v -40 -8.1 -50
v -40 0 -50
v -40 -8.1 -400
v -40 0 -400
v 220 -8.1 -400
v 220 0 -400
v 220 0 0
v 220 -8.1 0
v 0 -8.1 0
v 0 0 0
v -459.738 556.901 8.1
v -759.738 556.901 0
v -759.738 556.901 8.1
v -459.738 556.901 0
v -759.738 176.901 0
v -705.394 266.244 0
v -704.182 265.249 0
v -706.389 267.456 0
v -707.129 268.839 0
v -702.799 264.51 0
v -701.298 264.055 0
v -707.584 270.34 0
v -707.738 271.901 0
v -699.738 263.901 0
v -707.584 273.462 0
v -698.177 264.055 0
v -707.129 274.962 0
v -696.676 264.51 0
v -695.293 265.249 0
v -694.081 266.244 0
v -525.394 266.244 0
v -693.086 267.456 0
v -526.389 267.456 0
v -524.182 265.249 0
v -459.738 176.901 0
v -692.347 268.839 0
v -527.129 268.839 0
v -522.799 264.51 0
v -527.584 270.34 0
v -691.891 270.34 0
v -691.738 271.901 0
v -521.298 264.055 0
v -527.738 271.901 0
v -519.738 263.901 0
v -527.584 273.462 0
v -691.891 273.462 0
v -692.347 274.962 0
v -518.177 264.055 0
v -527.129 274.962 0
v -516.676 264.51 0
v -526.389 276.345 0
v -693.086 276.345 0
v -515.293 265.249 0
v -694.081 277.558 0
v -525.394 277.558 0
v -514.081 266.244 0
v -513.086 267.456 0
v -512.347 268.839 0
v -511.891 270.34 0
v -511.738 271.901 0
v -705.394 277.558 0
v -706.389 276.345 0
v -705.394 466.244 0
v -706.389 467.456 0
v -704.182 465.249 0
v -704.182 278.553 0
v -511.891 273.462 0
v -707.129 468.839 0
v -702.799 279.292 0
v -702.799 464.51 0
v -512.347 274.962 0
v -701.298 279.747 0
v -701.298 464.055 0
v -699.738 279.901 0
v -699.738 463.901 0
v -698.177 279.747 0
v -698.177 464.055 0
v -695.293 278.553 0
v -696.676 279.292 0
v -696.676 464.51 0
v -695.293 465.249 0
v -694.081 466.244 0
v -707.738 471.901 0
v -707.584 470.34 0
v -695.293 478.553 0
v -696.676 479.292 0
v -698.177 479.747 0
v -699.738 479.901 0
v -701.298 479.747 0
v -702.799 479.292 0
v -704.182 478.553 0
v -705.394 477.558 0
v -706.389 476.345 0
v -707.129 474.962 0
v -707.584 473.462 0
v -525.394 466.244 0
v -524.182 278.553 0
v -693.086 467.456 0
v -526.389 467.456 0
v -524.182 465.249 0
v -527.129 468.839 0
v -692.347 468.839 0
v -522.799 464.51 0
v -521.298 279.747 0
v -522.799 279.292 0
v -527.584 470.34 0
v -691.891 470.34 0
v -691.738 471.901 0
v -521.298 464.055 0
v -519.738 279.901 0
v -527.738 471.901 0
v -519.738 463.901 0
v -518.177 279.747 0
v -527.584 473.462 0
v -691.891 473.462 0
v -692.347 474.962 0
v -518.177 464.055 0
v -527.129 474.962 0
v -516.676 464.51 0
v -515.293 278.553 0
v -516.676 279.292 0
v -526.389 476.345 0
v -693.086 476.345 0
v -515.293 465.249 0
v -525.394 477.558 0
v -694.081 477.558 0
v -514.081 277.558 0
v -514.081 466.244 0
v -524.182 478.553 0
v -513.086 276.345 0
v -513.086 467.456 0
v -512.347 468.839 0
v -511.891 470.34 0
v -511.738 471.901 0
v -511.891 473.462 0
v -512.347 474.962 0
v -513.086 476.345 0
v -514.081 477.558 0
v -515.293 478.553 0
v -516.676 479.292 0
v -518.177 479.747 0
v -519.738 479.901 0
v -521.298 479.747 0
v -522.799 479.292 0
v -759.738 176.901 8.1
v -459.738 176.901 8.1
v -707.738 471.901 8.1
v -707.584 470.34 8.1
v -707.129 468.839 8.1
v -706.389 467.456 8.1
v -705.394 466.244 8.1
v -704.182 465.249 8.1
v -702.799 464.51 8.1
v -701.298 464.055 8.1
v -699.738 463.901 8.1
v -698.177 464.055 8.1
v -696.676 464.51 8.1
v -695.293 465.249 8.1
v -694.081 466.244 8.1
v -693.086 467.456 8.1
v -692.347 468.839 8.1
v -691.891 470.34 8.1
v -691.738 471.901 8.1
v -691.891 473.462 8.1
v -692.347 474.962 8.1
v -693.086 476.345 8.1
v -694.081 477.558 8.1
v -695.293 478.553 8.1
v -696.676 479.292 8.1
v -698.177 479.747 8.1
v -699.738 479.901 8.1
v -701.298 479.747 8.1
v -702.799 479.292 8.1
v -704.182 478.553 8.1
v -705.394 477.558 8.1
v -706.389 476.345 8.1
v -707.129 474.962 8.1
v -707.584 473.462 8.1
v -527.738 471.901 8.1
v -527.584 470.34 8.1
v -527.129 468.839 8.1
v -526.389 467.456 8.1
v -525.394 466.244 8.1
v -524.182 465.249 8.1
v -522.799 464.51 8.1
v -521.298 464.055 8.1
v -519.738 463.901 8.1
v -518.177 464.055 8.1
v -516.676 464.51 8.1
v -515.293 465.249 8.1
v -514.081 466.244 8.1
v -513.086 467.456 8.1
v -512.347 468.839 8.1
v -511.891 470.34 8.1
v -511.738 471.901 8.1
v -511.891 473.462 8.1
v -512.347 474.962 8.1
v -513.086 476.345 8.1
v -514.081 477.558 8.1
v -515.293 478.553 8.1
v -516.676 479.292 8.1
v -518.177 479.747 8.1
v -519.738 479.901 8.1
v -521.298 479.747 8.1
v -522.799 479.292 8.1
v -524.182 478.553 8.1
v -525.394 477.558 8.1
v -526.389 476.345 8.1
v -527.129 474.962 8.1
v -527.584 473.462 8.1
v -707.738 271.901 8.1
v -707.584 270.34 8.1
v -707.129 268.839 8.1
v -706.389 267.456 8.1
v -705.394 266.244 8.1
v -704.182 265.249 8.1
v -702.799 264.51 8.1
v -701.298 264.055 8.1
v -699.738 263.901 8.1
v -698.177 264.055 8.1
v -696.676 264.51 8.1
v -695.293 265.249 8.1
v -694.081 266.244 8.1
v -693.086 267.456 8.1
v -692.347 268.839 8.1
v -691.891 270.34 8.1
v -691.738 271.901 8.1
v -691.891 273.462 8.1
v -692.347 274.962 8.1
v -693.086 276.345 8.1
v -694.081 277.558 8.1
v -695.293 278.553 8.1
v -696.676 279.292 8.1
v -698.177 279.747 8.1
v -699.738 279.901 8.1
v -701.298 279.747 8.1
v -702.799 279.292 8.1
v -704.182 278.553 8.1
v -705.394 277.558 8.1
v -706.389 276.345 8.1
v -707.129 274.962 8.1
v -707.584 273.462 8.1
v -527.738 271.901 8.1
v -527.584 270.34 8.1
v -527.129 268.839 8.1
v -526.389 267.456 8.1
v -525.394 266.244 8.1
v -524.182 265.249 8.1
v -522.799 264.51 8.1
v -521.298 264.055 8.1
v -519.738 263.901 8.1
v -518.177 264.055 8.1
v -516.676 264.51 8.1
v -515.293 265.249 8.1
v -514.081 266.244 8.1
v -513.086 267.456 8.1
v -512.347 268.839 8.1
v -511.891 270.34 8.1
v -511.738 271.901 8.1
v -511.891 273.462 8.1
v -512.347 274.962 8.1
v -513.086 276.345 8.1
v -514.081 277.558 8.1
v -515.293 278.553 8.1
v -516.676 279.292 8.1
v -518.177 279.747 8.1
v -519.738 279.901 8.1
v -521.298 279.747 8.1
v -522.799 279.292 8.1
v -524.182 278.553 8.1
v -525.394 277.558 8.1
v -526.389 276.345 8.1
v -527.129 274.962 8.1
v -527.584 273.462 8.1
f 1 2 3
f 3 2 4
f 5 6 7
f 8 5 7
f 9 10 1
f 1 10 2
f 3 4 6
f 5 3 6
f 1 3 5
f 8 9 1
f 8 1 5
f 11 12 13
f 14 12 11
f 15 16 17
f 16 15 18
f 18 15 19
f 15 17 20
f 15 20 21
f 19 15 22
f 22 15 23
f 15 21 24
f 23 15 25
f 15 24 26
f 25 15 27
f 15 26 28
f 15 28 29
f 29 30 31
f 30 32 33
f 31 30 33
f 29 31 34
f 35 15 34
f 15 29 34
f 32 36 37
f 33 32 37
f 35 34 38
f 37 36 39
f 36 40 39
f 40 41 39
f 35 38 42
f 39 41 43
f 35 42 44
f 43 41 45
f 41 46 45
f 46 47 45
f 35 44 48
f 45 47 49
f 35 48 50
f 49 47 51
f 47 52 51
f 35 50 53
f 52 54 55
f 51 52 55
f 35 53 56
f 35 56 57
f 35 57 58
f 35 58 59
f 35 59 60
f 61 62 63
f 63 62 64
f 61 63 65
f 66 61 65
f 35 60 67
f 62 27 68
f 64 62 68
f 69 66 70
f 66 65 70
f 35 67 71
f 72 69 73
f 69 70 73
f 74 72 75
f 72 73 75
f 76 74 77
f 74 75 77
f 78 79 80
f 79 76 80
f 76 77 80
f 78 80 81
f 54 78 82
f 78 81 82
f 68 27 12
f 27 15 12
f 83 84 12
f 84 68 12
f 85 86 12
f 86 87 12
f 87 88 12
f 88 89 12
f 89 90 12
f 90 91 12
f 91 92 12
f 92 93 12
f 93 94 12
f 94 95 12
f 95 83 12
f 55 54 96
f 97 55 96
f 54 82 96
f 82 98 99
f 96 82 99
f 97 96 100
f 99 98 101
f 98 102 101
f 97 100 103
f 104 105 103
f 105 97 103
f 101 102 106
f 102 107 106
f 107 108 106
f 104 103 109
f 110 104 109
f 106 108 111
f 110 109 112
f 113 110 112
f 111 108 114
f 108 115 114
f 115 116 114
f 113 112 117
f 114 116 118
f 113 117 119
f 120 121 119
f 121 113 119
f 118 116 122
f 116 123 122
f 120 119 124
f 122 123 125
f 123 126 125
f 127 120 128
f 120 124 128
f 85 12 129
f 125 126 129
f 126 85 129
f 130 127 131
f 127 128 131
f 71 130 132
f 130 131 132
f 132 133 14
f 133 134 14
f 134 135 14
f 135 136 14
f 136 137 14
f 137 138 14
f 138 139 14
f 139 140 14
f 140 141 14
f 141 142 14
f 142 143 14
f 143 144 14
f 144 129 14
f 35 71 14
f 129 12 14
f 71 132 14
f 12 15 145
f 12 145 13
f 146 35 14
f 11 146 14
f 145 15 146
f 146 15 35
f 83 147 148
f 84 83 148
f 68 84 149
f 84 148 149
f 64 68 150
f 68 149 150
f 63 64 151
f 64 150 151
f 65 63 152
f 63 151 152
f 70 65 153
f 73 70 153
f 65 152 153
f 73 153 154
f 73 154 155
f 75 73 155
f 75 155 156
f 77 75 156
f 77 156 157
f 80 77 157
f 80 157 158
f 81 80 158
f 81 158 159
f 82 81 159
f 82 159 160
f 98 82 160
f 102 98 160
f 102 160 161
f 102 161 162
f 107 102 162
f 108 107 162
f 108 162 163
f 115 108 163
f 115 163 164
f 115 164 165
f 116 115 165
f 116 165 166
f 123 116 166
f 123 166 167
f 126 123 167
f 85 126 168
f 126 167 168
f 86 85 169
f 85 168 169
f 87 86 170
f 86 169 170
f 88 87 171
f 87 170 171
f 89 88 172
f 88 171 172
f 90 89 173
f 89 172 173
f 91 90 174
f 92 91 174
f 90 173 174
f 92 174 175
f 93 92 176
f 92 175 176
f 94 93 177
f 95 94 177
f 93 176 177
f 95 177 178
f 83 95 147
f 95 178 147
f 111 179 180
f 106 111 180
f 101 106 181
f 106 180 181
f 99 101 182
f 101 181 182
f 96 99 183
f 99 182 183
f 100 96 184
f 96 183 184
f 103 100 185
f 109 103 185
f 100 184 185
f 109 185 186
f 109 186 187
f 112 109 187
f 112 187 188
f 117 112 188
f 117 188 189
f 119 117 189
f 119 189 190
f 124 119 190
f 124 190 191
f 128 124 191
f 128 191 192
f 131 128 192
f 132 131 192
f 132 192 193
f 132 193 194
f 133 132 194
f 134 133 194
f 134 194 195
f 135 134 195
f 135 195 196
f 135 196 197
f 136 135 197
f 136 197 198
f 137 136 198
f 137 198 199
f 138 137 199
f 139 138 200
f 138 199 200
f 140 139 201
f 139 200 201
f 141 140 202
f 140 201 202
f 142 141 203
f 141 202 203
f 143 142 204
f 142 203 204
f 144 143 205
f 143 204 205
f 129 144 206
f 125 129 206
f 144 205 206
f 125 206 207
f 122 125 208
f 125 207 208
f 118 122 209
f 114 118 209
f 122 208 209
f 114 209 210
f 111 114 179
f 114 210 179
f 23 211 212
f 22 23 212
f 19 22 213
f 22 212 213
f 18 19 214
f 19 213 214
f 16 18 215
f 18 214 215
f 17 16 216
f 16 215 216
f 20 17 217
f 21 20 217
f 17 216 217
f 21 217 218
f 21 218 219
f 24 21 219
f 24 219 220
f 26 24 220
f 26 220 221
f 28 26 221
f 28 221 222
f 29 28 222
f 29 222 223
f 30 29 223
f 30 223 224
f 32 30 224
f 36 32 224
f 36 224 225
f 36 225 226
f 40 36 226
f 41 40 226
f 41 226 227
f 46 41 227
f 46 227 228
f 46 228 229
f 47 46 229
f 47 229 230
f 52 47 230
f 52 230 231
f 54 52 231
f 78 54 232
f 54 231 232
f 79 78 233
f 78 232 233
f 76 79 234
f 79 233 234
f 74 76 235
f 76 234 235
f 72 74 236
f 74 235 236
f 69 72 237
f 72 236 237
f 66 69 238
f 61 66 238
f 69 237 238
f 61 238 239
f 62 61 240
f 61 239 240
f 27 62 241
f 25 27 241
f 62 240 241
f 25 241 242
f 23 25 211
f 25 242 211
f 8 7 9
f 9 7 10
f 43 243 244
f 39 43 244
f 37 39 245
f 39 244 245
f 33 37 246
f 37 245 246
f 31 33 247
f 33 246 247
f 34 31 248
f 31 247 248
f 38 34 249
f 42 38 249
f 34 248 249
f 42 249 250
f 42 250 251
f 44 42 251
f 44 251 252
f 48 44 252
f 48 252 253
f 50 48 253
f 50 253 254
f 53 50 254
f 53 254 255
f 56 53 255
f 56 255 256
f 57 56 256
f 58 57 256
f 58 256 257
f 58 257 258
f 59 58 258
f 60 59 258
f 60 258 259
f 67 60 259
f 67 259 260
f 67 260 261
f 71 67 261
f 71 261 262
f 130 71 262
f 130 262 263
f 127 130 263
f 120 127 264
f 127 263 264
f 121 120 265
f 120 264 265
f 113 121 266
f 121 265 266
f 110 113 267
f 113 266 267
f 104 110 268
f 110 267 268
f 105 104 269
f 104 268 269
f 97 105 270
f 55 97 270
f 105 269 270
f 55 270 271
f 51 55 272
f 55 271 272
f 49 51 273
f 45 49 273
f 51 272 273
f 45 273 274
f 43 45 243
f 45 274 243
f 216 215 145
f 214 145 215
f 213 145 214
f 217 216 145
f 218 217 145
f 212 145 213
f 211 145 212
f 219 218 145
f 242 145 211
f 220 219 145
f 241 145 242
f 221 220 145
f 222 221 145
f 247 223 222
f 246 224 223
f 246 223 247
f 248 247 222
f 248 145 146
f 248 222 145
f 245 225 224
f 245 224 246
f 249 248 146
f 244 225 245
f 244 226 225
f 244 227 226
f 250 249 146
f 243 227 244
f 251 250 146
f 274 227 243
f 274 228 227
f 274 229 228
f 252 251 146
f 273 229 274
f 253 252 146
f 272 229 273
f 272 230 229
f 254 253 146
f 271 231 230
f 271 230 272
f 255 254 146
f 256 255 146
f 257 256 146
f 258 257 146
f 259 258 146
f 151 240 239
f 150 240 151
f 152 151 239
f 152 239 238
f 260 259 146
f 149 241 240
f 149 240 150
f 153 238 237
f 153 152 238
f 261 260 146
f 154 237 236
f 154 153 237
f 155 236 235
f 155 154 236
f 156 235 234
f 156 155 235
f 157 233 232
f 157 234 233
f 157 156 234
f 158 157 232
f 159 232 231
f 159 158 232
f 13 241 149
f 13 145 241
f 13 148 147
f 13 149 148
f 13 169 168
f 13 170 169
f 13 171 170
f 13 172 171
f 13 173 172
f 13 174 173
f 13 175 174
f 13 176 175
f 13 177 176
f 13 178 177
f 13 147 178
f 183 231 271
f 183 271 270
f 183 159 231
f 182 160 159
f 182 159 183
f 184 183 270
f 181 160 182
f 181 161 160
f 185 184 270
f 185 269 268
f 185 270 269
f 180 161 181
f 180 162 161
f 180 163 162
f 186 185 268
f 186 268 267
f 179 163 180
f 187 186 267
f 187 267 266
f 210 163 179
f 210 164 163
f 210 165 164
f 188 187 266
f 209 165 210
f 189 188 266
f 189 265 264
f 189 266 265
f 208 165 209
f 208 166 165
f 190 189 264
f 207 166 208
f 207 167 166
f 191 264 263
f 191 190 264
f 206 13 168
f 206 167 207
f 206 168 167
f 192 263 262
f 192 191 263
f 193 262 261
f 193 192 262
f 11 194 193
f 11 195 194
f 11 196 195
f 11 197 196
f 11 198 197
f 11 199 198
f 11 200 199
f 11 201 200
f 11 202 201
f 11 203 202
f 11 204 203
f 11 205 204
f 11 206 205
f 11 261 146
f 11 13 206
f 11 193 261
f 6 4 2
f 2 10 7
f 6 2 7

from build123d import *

# Parameters (mm, degrees)
F1_DEPTH = 8.1
F2_W     = 300
F2_H     = 380
F3_DEPTH = 8.1
F4_D     = 16


with BuildPart() as f1:
    # F0 (on Front) → F1 (new body)
    with BuildSketch(Plane.XZ):
        Polygon((220, 0), (0, 0), (-40, -50), (-40, -400), (220, -400), align=None)
    extrude(amount=F1_DEPTH)


with BuildPart() as f3:
    # F2 (on Top) → F3 (new body)
    with BuildSketch(Plane.XY):
        with Locations((-609.7375965118, 366.9008386184)):
            Rectangle(F2_W, F2_H)
    extrude(amount=F3_DEPTH)

    # F4 (through all)
    with Locations(Plane(origin=(0, 0, 0), x_dir=(1, 0, 0), z_dir=(0, 0, -1))):
        with Locations((-519.7375965118, -471.9008386184), (-699.7375965118, -471.9008386184), (-699.7375965118, -271.9008386184), (-519.7375965118, -271.9008386184)):
            Hole(F4_D / 2)


solid = Compound([f1.part, f3.part])
